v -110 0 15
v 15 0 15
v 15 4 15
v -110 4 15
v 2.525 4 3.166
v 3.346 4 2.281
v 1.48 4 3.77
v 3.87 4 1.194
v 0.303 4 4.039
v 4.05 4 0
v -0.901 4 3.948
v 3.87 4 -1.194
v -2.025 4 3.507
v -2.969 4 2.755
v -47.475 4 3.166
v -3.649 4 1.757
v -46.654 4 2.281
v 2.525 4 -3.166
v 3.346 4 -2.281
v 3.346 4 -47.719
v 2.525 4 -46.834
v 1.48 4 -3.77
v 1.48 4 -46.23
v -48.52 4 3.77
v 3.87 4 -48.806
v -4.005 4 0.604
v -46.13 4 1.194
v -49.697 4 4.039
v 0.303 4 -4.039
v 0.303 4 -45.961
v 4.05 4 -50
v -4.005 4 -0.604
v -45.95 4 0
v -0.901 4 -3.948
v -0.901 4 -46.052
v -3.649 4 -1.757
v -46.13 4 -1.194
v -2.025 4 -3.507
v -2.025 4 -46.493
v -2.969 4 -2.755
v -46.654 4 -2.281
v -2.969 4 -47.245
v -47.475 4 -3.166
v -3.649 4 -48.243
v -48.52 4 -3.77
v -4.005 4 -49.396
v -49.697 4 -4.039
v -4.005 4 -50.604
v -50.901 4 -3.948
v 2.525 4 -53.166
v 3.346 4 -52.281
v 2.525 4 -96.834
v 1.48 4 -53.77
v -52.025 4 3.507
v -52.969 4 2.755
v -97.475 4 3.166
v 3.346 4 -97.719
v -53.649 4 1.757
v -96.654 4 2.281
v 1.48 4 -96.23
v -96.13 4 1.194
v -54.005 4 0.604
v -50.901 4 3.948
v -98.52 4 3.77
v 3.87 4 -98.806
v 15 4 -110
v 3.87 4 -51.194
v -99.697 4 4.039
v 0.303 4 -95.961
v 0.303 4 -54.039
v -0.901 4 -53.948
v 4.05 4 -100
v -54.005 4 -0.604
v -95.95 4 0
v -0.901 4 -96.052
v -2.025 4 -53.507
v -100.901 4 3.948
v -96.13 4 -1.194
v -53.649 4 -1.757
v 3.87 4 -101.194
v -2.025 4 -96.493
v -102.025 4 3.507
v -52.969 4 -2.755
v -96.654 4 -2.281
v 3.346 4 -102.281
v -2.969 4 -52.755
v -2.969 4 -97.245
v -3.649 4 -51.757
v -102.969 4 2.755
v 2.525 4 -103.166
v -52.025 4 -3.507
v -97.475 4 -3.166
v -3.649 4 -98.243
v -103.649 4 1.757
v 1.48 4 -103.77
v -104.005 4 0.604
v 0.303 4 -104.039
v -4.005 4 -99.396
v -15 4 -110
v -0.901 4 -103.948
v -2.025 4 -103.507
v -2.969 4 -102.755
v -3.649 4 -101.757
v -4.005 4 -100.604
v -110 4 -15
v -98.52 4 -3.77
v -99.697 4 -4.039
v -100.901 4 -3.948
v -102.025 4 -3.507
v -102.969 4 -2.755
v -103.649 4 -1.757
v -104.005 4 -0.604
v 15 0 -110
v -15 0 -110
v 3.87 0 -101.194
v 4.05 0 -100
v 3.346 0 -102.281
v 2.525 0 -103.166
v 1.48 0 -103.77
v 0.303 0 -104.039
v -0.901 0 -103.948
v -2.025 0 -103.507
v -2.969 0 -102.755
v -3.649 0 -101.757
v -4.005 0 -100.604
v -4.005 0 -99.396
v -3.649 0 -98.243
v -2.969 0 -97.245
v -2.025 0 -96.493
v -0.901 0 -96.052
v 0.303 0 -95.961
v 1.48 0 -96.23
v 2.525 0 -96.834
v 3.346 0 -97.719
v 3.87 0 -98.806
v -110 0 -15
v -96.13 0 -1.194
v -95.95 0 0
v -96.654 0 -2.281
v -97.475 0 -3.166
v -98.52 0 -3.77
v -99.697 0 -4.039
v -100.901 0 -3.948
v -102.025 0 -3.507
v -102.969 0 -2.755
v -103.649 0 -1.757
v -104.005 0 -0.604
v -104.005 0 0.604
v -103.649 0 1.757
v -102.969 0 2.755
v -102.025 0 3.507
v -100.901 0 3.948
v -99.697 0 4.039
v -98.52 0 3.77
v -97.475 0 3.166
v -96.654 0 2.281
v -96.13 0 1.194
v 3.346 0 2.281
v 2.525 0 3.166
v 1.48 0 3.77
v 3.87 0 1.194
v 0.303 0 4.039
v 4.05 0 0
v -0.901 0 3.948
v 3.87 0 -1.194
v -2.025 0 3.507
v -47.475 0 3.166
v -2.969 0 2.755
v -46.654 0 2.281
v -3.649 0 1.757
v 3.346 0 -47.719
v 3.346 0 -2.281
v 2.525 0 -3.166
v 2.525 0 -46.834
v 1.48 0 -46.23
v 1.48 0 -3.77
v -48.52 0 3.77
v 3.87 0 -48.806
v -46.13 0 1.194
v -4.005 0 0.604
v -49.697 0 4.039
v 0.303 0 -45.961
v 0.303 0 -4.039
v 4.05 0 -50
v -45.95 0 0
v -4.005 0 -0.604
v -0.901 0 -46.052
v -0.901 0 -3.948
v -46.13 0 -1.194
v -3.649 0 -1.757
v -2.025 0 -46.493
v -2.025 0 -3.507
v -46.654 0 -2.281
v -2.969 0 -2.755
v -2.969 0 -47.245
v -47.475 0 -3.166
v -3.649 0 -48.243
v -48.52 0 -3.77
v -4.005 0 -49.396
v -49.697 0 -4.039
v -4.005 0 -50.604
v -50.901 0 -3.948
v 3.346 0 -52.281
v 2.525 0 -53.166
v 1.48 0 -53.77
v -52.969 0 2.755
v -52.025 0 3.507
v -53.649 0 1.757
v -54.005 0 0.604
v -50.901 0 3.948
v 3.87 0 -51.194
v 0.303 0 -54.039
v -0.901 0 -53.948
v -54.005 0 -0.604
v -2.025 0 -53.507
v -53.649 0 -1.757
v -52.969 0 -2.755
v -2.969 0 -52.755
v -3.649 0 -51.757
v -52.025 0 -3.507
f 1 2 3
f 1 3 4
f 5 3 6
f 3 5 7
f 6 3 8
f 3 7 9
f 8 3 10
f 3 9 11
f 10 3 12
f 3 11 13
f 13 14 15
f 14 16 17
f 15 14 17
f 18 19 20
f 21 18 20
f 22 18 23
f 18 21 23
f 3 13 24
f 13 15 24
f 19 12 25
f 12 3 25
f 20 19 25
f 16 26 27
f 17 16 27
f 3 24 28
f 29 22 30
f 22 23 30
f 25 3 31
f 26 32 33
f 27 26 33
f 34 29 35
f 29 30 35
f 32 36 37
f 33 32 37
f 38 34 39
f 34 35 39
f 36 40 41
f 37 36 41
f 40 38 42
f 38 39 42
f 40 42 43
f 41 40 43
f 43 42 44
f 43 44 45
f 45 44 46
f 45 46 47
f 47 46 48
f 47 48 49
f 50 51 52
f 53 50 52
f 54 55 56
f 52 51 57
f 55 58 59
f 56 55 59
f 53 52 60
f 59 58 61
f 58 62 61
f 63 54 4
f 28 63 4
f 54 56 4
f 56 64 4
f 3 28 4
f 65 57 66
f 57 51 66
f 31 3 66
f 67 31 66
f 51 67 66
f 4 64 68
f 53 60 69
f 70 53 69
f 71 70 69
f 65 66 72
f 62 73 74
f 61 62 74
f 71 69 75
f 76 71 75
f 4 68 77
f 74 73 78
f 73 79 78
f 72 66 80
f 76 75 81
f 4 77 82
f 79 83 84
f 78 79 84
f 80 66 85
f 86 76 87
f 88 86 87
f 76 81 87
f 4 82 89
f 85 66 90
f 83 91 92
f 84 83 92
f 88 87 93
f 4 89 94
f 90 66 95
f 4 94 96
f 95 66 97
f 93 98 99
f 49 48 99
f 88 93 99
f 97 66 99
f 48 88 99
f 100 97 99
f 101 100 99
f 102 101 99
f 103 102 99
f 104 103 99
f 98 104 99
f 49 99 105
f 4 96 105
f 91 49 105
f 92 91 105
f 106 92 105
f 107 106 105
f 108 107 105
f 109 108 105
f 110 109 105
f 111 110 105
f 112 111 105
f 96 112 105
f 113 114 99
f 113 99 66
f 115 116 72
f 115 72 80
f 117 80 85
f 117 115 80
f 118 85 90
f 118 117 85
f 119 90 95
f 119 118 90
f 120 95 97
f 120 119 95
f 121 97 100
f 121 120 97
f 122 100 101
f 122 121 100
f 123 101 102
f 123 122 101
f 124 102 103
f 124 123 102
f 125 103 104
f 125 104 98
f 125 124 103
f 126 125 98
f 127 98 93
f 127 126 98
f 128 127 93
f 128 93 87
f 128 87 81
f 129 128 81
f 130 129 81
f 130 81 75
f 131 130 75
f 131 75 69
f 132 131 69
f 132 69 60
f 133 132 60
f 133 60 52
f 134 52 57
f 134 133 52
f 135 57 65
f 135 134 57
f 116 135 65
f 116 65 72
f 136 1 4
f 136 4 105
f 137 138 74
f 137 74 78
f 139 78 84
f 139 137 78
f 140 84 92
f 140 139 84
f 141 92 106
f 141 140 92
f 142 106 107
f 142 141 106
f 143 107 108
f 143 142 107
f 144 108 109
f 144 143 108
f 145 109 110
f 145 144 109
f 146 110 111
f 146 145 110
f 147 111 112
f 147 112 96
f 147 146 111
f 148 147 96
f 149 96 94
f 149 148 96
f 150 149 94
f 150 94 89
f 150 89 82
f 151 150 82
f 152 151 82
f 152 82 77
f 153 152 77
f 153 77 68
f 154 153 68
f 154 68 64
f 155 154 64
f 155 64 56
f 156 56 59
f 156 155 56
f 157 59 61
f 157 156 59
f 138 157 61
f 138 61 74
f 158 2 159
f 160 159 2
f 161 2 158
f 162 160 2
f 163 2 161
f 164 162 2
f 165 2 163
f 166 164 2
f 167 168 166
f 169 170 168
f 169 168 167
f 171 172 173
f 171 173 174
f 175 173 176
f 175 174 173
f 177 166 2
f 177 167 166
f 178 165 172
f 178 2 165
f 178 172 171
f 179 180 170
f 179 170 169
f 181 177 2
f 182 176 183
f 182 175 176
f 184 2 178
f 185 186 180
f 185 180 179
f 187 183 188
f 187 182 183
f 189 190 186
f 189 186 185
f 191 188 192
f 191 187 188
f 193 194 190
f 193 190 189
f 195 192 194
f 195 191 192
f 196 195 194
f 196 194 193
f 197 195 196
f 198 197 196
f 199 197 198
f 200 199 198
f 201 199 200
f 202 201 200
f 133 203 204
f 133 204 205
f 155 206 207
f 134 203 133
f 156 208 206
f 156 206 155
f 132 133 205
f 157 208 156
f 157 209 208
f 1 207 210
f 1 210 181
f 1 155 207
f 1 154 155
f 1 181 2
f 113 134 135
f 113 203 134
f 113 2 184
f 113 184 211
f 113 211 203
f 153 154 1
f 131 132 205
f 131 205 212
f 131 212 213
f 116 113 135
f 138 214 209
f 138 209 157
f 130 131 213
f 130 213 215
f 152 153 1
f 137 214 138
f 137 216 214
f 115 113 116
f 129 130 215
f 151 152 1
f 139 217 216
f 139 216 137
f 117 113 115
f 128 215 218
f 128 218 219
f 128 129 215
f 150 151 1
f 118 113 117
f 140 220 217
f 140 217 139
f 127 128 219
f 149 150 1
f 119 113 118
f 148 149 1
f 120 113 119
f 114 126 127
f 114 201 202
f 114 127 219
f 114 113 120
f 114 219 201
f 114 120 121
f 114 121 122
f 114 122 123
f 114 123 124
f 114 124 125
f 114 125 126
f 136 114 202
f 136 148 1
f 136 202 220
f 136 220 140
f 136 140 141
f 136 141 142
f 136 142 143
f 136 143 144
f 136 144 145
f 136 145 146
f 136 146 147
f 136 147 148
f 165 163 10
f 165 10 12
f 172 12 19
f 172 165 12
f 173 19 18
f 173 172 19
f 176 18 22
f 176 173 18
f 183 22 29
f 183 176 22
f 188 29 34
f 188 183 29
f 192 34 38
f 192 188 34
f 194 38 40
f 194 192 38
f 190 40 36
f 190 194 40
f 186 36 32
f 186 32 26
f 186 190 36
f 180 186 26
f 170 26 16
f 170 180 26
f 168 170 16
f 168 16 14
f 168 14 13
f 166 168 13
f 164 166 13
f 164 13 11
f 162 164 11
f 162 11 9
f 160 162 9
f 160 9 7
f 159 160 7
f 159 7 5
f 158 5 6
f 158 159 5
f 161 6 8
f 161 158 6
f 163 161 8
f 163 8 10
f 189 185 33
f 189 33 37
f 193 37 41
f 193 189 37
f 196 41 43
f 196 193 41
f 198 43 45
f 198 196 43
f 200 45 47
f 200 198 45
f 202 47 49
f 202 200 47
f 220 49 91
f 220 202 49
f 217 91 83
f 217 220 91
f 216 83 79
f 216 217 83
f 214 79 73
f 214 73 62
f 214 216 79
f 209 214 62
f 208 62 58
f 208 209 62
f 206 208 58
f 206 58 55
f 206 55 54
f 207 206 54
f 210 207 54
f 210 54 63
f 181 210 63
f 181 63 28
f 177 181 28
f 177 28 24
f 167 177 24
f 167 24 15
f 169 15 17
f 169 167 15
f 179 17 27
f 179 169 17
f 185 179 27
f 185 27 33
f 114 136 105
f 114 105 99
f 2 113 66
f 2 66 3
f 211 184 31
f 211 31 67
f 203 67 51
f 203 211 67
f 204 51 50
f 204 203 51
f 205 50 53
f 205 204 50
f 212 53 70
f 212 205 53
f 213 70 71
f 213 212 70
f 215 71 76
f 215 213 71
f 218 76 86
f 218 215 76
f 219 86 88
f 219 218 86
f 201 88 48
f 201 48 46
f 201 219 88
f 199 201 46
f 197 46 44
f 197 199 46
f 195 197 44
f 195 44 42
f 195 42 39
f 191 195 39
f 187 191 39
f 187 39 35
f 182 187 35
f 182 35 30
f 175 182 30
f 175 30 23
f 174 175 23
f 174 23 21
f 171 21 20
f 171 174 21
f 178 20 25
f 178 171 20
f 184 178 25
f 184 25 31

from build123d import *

# Parameters (mm, degrees)
SKETCH1_R           = 4.05
BOSS_EXTRUDE1_DEPTH = 4


with BuildPart() as part:
    # Sketch1 → Boss-Extrude1 (new body)
    with BuildSketch(Plane(origin=(0, 0, 0), x_dir=(1, 0, 0), z_dir=(0, 1, 0))):
        Polygon((15, -15), (-110, -15), (-110, 15), (-15, 110), (15, 110), align=None)
        with Locations((-100, 0)):
            Circle(SKETCH1_R, mode=Mode.SUBTRACT)
        with Locations((-50, 0)):
            Circle(SKETCH1_R, mode=Mode.SUBTRACT)
        Circle(SKETCH1_R, mode=Mode.SUBTRACT)
        with Locations((0, 100)):
            Circle(SKETCH1_R, mode=Mode.SUBTRACT)
        with Locations((0, 50)):
            Circle(SKETCH1_R, mode=Mode.SUBTRACT)
    extrude(amount=BOSS_EXTRUDE1_DEPTH)


solid = part.part
